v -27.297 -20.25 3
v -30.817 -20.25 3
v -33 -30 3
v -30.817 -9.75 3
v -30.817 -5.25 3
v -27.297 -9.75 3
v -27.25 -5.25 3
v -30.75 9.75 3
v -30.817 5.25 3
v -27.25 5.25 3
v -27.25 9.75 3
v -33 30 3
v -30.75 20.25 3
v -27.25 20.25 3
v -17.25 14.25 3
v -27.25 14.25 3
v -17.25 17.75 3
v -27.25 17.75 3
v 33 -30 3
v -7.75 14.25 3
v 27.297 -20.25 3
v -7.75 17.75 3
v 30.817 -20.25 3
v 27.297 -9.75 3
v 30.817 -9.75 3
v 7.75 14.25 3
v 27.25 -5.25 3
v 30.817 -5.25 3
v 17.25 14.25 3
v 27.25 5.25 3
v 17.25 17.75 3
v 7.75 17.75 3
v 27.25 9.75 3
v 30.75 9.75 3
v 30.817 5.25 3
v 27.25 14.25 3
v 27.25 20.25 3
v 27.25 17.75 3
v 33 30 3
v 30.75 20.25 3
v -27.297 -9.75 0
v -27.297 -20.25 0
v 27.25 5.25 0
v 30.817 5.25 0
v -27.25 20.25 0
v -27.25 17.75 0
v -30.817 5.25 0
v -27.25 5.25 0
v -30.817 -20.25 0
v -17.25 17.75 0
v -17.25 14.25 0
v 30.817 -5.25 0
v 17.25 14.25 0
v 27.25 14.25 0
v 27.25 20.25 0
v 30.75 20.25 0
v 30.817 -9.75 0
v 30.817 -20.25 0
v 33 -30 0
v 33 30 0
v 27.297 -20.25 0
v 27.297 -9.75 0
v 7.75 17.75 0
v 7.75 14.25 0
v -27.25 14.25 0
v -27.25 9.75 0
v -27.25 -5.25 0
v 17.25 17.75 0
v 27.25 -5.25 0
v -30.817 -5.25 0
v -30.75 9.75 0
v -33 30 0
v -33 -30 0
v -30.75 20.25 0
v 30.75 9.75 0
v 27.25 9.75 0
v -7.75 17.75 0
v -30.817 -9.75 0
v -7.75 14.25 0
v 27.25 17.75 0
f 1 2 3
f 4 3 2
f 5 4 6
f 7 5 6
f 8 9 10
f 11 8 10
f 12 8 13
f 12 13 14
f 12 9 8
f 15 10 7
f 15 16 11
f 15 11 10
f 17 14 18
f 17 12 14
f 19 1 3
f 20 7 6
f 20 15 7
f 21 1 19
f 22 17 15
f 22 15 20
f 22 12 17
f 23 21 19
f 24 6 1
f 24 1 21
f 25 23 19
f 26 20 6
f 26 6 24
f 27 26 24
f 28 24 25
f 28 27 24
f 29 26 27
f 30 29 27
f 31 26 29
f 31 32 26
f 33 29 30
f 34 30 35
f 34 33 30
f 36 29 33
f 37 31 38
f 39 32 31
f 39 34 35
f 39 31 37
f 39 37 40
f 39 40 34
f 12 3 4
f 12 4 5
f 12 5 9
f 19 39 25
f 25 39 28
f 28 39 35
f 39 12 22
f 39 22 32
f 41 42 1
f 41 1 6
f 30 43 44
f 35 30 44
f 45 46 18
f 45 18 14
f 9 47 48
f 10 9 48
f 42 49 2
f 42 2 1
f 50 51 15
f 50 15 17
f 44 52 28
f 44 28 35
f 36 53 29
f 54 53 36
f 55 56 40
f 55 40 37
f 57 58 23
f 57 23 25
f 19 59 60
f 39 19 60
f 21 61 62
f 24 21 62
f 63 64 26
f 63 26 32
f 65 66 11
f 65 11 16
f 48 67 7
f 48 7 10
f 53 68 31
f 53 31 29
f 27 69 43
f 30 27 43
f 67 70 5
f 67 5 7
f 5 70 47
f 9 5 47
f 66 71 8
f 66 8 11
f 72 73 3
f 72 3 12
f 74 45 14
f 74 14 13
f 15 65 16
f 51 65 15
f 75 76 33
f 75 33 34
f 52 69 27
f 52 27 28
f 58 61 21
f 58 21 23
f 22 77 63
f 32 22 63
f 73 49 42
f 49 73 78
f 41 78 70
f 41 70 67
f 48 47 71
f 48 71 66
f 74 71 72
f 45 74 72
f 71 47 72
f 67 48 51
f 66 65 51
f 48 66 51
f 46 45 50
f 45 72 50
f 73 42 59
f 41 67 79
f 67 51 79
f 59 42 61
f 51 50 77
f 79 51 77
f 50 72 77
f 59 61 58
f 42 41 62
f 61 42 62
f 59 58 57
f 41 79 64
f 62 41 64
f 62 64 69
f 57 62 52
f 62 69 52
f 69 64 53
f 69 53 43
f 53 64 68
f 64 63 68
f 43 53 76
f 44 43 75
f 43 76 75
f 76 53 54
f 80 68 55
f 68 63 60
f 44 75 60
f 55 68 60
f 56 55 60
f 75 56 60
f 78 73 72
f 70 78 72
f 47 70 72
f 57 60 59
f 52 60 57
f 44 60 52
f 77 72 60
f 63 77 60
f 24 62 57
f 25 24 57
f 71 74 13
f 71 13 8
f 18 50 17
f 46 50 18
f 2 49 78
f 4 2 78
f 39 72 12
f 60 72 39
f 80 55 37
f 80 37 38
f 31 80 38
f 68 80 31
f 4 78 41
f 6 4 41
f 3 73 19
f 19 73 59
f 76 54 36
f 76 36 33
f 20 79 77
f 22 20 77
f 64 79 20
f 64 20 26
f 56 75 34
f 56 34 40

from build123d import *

# Parameters (mm, degrees)
SKETCH_1_W      = 66
SKETCH_1_H      = 60
SKETCH_1_W_2    = 15.5
SKETCH_1_H_2    = 3.5
SKETCH_1_W_3    = 3.566819074
SKETCH_1_H_3    = 10.5
SKETCH_1_W_4    = 3.520169939
EXTRUDE_1_DEPTH = 3


with BuildPart() as part:
    # Эскиз1 → Бобышка-Вытянуть1 (new body)
    with BuildSketch(Plane.XY):
        Rectangle(SKETCH_1_W, SKETCH_1_H)
        with Locations((0, 16)):
            Rectangle(SKETCH_1_W_2, SKETCH_1_H_2, mode=Mode.SUBTRACT)
        Polygon((-17.25, 17.75), (-27.25, 17.75), (-27.25, 20.25), (-30.75, 20.25), (-30.75, 9.75), (-27.25, 9.75), (-27.25, 14.25), (-17.25, 14.25), align=None, mode=Mode.SUBTRACT)
        with Locations((-29.033409537, 0)):
            Rectangle(SKETCH_1_W_3, SKETCH_1_H_3, mode=Mode.SUBTRACT)
        with Locations((-29.056734105, -15)):
            Rectangle(SKETCH_1_W_4, SKETCH_1_H_3, mode=Mode.SUBTRACT)
        with Locations((29.056734105, -15)):
            Rectangle(SKETCH_1_W_4, SKETCH_1_H_3, mode=Mode.SUBTRACT)
        with Locations((29.033409537, 0)):
            Rectangle(SKETCH_1_W_3, SKETCH_1_H_3, mode=Mode.SUBTRACT)
        Polygon((27.25, 20.25), (27.25, 17.75), (17.25, 17.75), (17.25, 14.25), (27.25, 14.25), (27.25, 9.75), (30.75, 9.75), (30.75, 20.25), align=None, mode=Mode.SUBTRACT)
    extrude(amount=EXTRUDE_1_DEPTH)


solid = part.part
